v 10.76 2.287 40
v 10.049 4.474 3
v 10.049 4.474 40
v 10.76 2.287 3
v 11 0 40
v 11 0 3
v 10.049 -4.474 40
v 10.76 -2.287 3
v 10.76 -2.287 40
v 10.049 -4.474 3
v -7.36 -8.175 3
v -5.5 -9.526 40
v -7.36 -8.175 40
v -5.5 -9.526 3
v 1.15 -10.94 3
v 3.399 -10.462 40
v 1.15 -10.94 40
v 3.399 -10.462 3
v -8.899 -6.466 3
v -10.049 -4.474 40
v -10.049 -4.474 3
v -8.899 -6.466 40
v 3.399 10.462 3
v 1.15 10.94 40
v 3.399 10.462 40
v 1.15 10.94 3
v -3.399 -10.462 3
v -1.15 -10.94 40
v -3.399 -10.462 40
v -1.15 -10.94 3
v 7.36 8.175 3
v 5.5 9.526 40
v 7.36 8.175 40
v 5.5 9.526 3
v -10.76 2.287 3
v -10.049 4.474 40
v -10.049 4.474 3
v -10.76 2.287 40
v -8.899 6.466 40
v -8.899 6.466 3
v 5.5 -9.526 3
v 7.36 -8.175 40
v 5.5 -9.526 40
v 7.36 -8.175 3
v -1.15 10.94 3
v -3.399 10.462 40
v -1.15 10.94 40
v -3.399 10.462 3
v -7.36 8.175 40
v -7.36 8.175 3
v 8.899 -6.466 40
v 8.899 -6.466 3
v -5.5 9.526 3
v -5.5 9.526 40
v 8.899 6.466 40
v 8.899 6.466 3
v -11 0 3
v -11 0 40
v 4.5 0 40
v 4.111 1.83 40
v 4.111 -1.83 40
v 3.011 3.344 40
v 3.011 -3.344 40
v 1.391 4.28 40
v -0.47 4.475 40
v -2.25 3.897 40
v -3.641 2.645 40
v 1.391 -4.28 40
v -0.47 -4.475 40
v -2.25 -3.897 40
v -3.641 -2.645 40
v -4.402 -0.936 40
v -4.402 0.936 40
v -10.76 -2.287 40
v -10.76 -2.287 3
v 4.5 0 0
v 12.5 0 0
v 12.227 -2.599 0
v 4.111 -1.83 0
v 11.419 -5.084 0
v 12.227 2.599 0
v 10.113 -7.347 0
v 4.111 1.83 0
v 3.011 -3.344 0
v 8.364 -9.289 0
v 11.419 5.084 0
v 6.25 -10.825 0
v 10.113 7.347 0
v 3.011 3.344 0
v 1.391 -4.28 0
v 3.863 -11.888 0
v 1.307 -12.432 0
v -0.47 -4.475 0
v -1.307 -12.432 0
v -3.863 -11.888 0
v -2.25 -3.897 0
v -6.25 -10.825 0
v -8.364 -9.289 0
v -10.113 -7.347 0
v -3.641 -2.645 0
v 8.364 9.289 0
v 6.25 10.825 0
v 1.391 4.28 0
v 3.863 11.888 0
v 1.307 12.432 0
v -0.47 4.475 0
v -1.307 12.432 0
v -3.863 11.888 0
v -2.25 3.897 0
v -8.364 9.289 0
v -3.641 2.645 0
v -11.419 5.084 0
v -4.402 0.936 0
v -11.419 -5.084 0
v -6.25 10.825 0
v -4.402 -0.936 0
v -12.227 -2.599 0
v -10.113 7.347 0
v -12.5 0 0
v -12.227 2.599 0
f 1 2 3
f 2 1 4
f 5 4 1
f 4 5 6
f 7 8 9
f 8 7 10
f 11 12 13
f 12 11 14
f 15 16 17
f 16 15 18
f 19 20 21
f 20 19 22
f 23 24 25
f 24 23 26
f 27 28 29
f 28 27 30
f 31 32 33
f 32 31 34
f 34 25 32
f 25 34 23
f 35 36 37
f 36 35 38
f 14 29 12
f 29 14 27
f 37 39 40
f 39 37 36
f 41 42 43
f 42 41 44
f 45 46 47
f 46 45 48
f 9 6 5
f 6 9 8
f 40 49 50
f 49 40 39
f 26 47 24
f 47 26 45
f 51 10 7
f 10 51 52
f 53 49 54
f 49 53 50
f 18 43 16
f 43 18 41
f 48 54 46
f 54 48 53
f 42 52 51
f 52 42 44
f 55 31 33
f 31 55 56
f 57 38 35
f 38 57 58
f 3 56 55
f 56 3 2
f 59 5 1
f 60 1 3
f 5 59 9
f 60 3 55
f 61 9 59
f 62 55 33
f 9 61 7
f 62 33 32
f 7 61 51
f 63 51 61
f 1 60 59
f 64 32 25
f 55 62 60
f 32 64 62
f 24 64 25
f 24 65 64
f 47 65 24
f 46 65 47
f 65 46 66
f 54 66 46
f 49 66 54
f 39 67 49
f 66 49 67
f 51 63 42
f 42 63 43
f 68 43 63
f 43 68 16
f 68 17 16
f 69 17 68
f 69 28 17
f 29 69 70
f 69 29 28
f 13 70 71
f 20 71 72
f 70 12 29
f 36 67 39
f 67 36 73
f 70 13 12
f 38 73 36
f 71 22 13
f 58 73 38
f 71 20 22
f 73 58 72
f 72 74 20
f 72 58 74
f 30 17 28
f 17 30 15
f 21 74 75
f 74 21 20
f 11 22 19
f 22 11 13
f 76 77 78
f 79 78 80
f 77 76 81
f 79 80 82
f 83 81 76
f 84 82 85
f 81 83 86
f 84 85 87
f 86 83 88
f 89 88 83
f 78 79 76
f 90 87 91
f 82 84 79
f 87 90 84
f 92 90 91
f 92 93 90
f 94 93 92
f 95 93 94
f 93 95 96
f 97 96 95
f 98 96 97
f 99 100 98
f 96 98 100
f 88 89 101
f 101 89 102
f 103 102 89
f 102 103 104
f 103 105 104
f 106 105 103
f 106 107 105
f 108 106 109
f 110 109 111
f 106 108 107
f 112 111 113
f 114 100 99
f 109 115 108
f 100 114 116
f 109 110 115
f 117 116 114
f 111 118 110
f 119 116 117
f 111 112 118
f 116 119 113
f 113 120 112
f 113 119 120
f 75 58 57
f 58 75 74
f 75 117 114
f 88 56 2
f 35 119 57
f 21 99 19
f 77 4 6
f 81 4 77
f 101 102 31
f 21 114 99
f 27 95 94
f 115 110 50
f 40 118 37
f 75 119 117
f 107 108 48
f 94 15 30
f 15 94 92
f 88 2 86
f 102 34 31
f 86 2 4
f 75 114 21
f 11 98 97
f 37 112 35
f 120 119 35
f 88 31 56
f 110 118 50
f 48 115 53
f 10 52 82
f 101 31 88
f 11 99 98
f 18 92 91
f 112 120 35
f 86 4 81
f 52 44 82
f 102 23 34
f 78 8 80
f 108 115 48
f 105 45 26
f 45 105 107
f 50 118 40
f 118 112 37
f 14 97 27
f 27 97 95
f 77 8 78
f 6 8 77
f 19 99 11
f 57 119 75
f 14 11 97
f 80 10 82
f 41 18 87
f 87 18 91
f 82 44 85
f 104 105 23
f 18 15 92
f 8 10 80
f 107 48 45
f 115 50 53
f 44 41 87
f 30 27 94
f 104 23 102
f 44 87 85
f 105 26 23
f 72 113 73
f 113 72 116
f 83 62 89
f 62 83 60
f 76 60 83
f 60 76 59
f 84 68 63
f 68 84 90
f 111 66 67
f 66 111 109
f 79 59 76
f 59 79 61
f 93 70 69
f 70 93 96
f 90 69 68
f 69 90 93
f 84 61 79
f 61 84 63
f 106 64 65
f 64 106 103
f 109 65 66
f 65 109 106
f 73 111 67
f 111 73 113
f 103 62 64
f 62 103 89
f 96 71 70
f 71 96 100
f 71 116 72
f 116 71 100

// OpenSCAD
difference() {
    union() {
        cylinder(d=22,h=7.5+2.5+30);
        cylinder(d1=25,d2=22,h=3);
    }
    
    translate([0,0,-1])
        cylinder(d=9,h=2+7.5+2.5+30);
}
